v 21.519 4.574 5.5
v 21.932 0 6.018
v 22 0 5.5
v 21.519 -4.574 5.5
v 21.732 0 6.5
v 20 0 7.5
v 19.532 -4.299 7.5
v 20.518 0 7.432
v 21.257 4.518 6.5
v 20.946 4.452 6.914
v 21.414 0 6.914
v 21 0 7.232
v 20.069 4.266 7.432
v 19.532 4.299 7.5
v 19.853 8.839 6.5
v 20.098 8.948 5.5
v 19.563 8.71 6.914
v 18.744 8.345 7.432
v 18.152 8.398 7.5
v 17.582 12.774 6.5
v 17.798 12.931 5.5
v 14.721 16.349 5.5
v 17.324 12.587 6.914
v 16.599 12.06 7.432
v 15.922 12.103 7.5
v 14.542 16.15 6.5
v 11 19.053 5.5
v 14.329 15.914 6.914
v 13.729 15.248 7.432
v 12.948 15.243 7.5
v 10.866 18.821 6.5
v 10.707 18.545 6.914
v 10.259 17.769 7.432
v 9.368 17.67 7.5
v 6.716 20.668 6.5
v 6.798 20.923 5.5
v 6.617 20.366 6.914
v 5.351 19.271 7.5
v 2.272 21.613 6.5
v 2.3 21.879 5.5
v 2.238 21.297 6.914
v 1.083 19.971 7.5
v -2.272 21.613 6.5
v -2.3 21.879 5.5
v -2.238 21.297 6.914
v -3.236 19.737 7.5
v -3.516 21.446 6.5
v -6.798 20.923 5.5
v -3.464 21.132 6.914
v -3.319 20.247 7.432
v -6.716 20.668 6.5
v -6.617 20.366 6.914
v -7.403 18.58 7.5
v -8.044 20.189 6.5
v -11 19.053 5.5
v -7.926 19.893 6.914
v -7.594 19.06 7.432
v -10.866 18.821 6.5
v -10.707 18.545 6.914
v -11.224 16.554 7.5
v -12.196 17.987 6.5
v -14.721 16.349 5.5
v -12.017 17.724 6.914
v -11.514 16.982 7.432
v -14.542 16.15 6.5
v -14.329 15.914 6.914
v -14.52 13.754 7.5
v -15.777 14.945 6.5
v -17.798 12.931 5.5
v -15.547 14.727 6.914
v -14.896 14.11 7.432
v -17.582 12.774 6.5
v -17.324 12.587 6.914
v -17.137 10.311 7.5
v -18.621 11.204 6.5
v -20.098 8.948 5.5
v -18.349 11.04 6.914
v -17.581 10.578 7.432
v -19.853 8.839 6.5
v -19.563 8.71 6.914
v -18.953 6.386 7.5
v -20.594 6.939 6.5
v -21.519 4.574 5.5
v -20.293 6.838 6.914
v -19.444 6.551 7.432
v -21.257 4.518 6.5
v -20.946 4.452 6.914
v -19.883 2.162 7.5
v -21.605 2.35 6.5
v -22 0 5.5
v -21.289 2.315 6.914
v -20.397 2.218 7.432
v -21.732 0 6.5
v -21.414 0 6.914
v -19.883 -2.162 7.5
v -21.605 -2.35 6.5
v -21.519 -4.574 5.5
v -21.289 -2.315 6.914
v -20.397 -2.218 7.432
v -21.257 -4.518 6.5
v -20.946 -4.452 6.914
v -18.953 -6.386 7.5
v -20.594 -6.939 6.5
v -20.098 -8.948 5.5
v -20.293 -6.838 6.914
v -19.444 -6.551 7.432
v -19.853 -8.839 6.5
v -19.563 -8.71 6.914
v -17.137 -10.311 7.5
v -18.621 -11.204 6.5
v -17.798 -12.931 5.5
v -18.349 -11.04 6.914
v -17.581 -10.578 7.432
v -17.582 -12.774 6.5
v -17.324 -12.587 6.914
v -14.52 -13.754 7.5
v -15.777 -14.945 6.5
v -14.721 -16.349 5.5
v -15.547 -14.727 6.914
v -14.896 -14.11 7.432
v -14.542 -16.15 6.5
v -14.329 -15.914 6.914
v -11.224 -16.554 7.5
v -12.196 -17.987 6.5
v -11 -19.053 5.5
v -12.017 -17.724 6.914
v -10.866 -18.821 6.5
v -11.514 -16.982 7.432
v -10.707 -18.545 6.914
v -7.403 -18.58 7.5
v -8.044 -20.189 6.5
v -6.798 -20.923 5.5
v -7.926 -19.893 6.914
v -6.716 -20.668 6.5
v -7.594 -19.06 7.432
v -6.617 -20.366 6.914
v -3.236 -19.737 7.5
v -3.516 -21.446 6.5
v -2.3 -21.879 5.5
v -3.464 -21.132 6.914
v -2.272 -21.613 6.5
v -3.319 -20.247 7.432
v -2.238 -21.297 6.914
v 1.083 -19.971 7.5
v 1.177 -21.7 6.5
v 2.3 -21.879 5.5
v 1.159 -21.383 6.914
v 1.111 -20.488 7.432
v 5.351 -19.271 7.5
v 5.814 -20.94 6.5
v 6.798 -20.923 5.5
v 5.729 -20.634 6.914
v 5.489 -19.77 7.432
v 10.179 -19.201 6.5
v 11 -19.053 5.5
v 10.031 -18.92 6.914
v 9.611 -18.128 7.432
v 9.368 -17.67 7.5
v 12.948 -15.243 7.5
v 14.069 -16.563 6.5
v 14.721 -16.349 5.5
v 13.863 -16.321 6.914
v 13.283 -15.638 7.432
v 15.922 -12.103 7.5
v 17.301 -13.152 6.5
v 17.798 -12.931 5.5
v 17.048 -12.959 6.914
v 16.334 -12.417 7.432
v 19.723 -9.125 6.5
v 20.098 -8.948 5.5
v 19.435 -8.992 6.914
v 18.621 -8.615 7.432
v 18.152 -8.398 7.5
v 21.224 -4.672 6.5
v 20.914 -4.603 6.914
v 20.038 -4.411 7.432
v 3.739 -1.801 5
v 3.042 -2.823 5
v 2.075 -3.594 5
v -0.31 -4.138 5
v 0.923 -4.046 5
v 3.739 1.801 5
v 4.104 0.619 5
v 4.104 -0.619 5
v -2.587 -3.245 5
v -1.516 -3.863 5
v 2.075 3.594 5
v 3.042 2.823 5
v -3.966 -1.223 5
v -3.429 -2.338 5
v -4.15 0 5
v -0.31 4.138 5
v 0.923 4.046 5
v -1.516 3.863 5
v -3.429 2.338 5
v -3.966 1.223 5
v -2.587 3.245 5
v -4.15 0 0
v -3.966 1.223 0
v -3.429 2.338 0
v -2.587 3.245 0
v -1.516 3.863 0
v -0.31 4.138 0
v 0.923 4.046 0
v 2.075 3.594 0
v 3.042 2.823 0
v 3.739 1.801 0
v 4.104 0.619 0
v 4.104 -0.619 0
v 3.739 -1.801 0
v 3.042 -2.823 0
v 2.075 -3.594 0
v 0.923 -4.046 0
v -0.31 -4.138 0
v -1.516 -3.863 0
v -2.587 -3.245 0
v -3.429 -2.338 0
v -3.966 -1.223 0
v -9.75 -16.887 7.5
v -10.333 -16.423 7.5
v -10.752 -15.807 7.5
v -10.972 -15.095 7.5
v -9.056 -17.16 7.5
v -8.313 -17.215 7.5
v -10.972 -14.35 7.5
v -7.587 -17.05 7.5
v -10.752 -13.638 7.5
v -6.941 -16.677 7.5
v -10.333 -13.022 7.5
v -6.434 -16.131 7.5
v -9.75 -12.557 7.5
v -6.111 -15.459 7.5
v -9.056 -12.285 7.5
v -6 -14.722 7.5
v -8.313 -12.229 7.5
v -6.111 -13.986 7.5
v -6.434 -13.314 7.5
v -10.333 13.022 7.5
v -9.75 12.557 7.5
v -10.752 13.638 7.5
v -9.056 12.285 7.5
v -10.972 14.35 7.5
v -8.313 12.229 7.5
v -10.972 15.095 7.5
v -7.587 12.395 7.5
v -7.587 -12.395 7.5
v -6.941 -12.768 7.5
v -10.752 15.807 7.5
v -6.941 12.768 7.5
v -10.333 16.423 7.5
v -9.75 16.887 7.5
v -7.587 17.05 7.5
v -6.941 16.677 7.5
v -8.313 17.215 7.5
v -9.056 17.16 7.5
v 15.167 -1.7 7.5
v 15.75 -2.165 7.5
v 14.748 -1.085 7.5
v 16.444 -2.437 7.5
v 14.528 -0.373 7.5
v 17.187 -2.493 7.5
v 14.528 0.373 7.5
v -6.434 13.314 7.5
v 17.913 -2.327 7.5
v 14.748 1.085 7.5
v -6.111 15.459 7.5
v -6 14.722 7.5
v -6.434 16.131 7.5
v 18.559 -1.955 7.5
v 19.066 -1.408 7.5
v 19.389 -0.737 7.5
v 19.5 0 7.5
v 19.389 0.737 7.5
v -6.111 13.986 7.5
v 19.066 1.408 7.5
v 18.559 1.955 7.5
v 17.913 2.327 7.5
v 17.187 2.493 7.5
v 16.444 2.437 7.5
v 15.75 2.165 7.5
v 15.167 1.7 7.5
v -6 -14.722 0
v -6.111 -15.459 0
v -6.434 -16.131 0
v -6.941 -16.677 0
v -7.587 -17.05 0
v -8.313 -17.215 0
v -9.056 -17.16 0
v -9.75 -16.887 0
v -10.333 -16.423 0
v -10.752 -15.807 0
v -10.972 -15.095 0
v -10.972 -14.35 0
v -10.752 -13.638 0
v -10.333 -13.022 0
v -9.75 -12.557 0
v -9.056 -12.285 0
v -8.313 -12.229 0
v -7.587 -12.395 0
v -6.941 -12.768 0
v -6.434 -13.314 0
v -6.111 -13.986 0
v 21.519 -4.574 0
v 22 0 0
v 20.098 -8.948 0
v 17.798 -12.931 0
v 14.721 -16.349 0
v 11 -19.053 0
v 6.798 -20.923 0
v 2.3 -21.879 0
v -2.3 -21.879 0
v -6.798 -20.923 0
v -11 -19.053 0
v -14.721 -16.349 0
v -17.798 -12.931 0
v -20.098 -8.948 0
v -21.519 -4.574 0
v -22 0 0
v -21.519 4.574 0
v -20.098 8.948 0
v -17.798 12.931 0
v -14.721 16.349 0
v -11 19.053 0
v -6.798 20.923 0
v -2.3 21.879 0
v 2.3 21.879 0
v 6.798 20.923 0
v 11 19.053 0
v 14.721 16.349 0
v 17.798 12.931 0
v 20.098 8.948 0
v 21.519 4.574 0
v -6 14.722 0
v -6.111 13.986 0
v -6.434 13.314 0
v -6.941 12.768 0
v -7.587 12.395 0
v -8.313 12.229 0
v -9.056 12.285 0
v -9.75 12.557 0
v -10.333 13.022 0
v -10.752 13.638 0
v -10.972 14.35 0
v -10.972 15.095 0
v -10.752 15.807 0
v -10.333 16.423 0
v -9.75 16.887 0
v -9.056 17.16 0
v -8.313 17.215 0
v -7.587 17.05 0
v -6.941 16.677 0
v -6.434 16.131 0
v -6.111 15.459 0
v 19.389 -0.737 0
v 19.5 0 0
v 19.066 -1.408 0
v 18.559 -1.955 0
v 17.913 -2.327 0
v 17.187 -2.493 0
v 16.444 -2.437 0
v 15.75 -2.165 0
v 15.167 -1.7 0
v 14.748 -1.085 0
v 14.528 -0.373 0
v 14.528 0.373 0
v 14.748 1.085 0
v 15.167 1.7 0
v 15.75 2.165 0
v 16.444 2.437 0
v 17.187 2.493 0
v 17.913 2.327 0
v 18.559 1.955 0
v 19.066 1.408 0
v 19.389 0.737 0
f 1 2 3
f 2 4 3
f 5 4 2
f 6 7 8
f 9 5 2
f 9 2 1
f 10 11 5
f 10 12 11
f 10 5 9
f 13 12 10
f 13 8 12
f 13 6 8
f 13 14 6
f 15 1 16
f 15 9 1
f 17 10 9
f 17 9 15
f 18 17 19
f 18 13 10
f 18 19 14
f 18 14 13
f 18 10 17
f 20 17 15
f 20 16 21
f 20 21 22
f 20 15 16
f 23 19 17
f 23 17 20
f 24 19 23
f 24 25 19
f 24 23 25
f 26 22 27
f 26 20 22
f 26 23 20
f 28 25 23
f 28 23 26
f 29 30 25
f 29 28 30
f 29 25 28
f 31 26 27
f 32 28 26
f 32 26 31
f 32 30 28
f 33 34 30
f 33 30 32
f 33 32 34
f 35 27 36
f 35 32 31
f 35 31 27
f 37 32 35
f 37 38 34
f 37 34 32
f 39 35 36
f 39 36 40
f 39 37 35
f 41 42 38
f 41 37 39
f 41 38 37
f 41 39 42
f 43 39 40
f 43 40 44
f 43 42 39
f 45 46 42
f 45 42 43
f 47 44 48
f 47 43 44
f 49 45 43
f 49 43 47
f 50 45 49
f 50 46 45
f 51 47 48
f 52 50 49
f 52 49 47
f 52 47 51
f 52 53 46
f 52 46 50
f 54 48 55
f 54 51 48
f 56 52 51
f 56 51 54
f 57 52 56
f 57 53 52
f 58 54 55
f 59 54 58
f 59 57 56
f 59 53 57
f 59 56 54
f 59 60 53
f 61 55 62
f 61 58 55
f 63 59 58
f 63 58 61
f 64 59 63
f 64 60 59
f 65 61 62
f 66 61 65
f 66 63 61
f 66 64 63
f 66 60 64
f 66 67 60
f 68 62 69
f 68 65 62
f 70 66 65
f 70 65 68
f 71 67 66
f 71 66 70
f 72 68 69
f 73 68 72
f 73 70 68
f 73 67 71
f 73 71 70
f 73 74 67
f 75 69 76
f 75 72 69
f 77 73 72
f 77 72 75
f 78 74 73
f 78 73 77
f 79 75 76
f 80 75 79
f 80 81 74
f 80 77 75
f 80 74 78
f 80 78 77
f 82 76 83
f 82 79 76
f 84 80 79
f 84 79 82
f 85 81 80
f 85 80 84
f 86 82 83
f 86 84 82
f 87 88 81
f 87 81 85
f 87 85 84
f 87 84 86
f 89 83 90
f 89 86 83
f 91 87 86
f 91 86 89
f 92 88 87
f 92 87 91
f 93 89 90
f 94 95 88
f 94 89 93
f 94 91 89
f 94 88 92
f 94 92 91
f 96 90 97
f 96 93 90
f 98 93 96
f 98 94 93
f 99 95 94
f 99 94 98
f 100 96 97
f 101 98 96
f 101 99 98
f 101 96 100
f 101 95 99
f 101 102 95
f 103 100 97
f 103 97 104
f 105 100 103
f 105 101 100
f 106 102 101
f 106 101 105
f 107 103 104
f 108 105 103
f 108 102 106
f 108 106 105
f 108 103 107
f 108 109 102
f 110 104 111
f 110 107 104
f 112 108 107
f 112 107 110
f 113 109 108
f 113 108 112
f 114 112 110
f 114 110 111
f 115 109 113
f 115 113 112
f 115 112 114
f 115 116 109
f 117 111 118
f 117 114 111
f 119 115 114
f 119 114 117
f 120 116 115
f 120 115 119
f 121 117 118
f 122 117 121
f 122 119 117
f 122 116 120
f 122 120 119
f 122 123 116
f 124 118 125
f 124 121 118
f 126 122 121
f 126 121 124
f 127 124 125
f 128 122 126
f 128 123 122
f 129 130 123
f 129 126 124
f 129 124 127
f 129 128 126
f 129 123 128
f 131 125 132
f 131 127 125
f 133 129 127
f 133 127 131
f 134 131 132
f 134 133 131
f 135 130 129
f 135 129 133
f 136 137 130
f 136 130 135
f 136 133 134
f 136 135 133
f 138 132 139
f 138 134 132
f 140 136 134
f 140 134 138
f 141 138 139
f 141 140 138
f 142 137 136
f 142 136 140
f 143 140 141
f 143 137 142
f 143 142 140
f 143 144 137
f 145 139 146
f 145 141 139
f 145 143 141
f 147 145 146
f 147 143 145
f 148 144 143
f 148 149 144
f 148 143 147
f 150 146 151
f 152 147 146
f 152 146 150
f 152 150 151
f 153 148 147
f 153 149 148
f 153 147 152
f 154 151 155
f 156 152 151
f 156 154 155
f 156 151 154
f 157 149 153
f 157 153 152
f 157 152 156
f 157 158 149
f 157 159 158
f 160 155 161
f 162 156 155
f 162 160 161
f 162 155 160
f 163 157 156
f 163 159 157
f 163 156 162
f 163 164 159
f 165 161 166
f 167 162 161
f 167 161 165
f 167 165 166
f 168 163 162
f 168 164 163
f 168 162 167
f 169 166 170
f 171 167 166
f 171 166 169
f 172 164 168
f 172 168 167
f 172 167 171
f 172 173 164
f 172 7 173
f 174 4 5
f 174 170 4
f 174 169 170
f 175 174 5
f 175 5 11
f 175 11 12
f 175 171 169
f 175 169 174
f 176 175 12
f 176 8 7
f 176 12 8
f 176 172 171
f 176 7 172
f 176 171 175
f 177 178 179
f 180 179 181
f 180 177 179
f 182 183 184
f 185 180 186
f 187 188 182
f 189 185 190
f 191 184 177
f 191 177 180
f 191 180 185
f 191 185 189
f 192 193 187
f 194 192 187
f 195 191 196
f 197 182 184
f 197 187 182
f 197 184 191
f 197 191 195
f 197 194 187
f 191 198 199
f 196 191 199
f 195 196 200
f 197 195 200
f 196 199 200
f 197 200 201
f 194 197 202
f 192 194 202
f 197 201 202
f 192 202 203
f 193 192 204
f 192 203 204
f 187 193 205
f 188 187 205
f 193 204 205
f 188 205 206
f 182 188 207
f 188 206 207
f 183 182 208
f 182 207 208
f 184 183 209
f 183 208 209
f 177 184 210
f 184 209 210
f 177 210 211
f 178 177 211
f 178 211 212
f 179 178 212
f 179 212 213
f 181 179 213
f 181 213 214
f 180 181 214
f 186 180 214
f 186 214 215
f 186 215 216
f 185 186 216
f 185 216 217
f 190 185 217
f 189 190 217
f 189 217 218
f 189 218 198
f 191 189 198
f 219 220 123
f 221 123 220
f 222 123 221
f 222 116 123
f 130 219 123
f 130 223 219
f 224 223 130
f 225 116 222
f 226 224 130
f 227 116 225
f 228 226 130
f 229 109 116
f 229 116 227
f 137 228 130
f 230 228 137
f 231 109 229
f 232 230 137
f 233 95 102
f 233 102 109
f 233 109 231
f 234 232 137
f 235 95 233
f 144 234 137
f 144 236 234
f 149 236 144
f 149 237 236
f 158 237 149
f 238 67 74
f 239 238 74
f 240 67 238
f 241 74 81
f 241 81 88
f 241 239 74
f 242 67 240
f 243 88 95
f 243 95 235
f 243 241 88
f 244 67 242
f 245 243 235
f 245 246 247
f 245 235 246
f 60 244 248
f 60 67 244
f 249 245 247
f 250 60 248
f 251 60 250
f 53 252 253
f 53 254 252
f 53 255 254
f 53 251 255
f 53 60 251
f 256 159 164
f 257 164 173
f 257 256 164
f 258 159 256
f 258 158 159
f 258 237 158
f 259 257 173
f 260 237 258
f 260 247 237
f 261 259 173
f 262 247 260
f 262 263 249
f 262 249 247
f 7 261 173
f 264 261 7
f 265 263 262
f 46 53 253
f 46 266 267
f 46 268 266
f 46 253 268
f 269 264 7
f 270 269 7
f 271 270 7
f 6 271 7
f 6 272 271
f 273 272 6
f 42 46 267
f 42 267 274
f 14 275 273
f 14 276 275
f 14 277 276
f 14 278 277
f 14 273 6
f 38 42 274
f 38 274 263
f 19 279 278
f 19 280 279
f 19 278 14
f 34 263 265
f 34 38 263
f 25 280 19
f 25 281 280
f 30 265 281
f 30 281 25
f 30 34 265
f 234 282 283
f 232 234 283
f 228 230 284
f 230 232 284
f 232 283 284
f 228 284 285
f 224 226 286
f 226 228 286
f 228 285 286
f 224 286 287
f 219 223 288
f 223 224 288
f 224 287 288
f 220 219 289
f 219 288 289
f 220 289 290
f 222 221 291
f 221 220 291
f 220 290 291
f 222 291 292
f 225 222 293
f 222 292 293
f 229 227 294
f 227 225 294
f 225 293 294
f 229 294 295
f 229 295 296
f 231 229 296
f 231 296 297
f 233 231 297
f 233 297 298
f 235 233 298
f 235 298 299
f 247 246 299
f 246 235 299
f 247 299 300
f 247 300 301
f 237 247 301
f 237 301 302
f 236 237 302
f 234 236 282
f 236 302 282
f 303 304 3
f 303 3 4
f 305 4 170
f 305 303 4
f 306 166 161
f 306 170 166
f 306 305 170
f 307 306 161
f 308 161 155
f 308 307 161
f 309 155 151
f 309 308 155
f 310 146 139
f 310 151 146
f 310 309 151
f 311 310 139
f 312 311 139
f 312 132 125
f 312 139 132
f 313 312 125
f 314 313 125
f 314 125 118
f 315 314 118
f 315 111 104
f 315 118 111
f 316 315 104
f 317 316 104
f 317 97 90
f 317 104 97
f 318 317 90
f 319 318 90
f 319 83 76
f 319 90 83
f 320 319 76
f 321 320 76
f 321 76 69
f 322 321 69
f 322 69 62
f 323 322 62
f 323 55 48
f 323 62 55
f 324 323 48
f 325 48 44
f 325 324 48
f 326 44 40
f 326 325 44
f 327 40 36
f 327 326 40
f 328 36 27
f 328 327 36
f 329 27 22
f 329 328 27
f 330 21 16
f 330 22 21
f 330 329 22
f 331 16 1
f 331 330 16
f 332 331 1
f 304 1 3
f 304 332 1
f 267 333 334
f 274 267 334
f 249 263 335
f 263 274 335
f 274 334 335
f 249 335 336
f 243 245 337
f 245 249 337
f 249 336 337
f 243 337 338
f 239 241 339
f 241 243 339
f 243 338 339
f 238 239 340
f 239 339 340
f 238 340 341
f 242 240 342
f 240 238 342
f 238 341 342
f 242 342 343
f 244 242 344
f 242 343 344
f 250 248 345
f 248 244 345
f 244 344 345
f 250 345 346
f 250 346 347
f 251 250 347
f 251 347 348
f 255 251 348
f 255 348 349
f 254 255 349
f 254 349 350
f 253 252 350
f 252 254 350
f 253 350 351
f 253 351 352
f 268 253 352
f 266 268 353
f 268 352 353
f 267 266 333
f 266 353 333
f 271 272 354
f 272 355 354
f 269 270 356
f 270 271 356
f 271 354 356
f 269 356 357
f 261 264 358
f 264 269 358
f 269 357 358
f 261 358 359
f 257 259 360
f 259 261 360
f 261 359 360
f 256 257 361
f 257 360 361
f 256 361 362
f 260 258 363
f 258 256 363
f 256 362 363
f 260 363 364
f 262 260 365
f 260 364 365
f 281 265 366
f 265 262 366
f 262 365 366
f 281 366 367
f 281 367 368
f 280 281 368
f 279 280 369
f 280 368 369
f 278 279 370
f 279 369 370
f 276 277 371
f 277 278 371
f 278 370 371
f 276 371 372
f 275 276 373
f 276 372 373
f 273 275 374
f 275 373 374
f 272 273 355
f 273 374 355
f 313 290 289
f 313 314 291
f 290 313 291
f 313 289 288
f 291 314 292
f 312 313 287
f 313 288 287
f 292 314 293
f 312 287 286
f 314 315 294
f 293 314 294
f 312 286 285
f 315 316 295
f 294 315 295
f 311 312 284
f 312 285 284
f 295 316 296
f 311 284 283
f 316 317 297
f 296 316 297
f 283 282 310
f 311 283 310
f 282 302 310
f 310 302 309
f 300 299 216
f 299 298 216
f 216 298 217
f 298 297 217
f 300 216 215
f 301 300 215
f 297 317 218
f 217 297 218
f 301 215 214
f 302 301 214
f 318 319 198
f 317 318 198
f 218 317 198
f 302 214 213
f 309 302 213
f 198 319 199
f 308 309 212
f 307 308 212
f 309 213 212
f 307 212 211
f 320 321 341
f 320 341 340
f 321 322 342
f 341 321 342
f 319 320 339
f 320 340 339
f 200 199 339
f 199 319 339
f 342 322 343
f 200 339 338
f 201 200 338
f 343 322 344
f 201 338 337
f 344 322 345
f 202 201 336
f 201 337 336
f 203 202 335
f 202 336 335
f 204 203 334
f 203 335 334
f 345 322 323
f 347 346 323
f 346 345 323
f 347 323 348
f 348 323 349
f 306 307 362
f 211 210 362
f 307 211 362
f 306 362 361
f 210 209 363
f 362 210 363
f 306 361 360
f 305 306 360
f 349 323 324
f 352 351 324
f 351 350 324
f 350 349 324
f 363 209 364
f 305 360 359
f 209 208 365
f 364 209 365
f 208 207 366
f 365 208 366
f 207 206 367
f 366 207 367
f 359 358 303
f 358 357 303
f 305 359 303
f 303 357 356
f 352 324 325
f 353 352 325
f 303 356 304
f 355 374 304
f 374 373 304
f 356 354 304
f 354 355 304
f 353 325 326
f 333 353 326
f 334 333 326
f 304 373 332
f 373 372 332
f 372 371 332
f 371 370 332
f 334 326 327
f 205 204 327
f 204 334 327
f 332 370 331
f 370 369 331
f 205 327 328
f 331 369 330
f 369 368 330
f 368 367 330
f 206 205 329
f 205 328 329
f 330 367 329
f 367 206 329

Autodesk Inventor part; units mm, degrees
ref_plane "YZ Plane" through (0, 0, 0) normal (1, 0, 0) x (0, 1, 0)
ref_plane "XZ Plane" through (0, 0, 0) normal (0, 1, 0) x (-1, 0, 0)
ref_plane "XY Plane" through (0, 0, 0) normal (0, 0, 1) x (1, 0, 0)
sketch "Sketch1" plane through (0, 0, 0) normal (0, 0, 1) x (1, 0, 0)
  circle A0 centre (0, 0) radius 22
  circle A1 centre (17, 0) radius 2.5
  circle A2 centre (-8.5, 14.7224) radius 2.5
  circle A3 centre (-8.5, -14.7224) radius 2.5
  dimension "d0" = 44
  dimension "d1" = 5
  dimension "d2" = 17
  dimension "d5" = 360
extrude "Extrusion1" add sketch "Sketch1" along normal blind 7.5
fillet "Fillet1" radius 2 1 edges at (-22, 0, 7.5)
sketch "Sketch2" plane through (0, 0, 0) normal (0, 0, -1) x (-1, 0, 0)
  circle A0 centre (0, 0) radius 4.15
  dimension "d10" = 8.3
extrude "Extrusion2" cut sketch "Sketch2" against normal blind 5
properties part number "AA014" material "ABS Plastic"
